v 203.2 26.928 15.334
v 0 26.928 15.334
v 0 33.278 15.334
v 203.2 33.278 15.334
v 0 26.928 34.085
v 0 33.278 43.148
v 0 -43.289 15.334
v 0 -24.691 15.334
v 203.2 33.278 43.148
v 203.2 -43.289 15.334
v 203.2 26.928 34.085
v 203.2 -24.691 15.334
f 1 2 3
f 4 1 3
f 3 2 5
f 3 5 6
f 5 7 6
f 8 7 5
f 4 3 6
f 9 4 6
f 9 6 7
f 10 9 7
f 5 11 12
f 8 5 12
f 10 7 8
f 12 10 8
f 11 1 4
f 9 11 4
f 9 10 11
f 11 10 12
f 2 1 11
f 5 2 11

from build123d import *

# Parameters (mm, degrees)
F0_W     = 58.9387752116
F0_H     = 49.3731051683
F1_DEPTH = 134.7465757281
F2_R     = 16.9673265676
F3_DEPTH = 58.9397752116
F4_R     = 12.7
F7_DEPTH = 203.2
F9_DEPTH = 203.201


with BuildPart() as f1:
    # F0 (on Top) → F1 (new body)
    with BuildSketch(Plane.XY):
        with Locations((3.1067002565, 0.1738145947)):
            Rectangle(F0_W, F0_H)
    extrude(amount=F1_DEPTH)

    # F2 (on face) → F3 (cut, through all)
    with BuildSketch(Plane(origin=(-26.3626873493, 0, 0), x_dir=(0, -1, 0), z_dir=(-1, 0, 0))):
        with Locations((10.2675408125, 109.3456819654)):
            Circle(F2_R)
    extrude(amount=-F3_DEPTH, mode=Mode.SUBTRACT)

    # F4
    f4_edges = [f1.edges().sort_by_distance(p)[0] for p in [
        (32.576088, 0.173815, 134.746576),
    ]]
    fillet(f4_edges, radius=F4_R)


with BuildPart() as f7:
    # F6 (on Right) → F7 (new body)
    with BuildSketch(Plane.YZ):
        Polygon((33.2775712013, 15.3340250254), (33.2775712013, 43.1480407715), (-43.289065361, 15.3340250254), align=None)
    extrude(amount=F7_DEPTH)

    # F8 (on face) → F9 (cut, through all)
    with BuildSketch(Plane.YZ.offset(203.2)):
        Polygon((26.9275712013, 34.0853054408), (-24.6910978089, 15.3340250254), (26.9275712013, 15.3340250254), align=None)
    extrude(amount=-F9_DEPTH, mode=Mode.SUBTRACT)


solid = f7.part
